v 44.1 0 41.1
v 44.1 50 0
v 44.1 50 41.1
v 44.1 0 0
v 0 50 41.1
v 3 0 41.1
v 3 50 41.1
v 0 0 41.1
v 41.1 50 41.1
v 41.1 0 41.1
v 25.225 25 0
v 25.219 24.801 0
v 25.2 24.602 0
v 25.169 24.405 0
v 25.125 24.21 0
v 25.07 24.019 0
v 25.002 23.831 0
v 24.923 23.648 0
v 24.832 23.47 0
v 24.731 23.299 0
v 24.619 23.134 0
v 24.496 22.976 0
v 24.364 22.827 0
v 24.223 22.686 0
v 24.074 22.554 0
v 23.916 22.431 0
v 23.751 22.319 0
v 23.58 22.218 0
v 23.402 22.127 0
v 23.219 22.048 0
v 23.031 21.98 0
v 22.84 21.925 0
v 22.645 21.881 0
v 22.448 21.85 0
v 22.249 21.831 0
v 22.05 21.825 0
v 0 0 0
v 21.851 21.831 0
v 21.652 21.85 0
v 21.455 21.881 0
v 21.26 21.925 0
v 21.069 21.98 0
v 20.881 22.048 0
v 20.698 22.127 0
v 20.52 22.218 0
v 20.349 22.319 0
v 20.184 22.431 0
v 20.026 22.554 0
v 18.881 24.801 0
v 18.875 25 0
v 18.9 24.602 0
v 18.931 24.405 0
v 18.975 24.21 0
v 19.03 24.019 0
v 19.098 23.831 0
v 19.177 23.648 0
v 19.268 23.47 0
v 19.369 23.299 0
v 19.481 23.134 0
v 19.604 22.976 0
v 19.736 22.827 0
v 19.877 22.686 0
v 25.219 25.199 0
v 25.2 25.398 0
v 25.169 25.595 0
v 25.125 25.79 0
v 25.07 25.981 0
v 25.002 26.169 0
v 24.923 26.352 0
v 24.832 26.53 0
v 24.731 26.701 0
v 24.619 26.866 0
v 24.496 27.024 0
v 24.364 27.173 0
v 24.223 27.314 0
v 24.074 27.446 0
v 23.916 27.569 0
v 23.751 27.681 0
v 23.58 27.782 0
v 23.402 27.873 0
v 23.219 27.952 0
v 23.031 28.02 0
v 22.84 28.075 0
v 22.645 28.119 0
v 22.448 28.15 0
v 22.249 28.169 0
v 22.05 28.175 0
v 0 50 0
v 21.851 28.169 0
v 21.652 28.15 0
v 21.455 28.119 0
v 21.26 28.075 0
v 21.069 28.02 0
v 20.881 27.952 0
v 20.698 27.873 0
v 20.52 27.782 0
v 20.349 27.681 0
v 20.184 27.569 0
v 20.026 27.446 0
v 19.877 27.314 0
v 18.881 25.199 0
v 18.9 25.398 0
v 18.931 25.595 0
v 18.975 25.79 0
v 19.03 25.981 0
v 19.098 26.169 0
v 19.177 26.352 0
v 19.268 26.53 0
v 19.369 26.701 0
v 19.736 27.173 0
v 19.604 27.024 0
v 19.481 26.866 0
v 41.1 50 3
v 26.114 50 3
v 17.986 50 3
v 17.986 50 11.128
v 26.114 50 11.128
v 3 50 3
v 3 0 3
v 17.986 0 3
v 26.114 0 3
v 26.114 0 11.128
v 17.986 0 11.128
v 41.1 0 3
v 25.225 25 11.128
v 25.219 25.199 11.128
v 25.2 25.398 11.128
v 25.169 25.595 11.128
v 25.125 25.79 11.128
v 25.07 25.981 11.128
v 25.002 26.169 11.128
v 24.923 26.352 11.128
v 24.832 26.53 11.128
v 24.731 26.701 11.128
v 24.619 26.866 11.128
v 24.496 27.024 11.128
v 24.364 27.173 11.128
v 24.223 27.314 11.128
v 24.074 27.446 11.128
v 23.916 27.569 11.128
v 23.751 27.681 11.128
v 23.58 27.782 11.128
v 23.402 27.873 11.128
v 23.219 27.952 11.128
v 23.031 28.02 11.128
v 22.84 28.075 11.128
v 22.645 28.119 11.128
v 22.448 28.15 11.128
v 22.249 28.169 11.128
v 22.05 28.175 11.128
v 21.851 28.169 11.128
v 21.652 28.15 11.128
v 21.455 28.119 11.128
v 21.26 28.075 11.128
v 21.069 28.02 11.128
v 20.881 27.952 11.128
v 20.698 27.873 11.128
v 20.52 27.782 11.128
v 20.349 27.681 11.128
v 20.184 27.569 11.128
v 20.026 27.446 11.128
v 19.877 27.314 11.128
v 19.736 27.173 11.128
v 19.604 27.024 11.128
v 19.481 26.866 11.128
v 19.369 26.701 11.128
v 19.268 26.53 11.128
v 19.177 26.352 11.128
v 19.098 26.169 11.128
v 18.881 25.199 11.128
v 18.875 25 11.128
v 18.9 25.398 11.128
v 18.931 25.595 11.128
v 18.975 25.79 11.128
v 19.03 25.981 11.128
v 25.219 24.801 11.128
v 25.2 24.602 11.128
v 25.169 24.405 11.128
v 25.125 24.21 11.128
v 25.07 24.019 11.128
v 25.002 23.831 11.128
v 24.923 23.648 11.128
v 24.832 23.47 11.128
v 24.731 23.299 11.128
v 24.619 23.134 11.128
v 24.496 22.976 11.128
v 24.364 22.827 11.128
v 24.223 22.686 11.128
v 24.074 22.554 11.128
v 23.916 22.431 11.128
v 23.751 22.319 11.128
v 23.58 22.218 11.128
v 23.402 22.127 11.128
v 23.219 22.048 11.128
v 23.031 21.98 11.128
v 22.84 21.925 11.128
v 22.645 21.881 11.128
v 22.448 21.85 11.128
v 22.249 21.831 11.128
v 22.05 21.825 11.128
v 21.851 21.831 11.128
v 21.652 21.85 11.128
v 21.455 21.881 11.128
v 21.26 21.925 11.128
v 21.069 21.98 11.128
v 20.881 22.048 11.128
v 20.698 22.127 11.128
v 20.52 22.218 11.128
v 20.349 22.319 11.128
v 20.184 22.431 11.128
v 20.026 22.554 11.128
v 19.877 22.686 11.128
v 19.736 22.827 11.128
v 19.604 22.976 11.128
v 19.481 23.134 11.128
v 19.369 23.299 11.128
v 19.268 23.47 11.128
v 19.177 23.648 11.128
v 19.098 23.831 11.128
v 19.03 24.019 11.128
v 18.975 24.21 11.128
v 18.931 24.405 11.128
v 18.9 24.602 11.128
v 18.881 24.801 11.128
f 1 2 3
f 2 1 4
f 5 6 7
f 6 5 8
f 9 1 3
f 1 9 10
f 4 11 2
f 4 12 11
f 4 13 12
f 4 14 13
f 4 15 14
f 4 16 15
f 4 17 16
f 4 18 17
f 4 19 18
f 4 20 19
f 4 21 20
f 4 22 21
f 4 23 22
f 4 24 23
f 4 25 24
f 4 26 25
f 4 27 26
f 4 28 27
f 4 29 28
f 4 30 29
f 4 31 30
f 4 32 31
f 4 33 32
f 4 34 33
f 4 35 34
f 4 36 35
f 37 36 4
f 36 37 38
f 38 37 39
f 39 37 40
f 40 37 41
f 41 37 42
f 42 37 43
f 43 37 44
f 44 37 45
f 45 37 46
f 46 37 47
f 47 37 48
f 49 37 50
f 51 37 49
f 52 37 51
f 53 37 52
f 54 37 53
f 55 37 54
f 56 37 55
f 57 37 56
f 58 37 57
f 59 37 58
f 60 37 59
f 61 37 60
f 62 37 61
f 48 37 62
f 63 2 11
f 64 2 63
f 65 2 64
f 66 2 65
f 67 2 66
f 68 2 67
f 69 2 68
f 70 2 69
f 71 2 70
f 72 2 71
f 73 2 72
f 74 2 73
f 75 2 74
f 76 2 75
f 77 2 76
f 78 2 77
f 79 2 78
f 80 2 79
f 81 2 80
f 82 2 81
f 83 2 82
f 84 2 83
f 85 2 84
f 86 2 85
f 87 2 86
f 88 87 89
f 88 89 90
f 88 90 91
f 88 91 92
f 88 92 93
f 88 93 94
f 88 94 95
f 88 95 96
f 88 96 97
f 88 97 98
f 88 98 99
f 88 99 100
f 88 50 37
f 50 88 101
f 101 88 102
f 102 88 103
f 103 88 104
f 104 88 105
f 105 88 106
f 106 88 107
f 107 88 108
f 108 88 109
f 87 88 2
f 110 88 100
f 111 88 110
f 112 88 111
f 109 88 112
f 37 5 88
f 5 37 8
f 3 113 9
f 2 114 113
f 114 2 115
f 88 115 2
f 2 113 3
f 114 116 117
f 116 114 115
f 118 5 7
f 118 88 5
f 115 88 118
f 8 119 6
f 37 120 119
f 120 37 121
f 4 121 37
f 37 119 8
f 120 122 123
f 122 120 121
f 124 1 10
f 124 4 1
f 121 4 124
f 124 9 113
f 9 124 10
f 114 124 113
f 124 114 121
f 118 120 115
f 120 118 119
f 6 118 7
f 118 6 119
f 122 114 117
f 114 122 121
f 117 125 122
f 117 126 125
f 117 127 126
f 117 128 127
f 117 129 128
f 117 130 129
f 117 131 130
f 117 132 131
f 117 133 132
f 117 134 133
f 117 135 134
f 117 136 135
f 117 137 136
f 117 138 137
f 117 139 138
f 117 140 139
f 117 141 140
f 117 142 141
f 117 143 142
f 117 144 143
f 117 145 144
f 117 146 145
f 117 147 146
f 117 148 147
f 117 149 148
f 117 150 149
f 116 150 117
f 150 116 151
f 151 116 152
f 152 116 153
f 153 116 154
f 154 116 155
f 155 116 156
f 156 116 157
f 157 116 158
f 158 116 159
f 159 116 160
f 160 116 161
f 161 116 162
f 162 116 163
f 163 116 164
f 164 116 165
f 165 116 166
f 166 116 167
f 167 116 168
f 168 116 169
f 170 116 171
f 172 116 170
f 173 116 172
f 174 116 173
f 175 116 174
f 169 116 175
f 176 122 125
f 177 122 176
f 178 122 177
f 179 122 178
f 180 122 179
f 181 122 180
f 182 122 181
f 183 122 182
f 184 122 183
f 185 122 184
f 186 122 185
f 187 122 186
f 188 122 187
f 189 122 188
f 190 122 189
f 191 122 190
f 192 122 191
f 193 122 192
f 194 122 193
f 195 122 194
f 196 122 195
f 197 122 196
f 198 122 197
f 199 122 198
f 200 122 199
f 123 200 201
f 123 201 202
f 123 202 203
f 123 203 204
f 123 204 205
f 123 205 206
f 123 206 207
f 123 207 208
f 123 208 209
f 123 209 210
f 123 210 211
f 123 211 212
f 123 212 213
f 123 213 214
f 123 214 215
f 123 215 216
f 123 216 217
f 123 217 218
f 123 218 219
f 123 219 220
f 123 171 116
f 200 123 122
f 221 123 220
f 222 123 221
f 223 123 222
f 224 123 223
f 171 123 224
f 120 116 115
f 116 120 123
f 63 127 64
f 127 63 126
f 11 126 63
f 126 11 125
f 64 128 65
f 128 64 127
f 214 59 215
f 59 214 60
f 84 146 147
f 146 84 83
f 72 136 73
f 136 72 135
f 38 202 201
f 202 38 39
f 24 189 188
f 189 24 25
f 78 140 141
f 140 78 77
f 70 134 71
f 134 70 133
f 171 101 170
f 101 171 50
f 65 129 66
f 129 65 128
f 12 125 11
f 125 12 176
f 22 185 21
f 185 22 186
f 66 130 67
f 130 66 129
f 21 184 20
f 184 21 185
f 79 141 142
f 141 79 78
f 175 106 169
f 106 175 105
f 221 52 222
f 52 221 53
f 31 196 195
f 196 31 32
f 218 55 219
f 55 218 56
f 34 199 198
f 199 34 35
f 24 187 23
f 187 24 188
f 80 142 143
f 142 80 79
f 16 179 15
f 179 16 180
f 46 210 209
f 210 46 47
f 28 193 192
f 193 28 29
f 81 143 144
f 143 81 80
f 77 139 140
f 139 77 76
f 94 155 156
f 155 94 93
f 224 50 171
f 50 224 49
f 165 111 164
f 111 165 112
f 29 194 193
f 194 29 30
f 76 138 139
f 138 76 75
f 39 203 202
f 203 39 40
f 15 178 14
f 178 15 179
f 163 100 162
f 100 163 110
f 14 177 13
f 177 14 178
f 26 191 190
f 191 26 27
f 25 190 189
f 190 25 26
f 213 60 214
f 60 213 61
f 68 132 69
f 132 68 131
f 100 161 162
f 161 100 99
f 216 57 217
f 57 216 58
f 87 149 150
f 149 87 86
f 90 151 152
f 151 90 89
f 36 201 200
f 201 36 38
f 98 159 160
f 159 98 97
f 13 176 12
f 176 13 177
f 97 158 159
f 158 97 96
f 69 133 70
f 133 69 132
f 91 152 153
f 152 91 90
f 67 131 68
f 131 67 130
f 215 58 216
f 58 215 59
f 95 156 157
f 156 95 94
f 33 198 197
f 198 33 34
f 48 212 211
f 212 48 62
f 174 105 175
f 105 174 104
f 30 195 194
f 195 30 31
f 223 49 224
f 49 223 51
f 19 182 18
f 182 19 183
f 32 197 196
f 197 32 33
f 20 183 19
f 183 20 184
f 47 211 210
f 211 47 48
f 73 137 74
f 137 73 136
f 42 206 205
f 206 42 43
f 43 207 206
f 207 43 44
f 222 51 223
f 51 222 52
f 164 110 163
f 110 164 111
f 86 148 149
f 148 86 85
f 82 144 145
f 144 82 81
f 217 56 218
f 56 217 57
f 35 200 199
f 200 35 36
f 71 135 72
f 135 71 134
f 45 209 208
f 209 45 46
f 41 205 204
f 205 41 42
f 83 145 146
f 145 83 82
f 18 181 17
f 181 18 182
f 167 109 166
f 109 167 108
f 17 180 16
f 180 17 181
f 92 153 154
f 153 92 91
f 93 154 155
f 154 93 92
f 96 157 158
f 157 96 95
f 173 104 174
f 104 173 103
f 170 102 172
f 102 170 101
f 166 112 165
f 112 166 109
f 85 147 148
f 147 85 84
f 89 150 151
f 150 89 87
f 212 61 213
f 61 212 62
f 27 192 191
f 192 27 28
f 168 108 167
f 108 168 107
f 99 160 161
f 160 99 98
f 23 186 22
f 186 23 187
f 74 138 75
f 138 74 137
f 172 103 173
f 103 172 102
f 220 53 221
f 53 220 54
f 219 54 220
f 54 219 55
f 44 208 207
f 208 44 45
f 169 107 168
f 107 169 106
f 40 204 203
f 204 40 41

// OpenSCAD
$fn = 100;
padding = 3;
xz = 38.1;
y = 50;
channel_xz = 8.128;
drill_dia = 6.35;
difference() {
  union() {
    //main hollow box
    difference() {
      cube([xz+padding*2, y, xz+padding]);
      translate([padding, -1, padding]) {
        cube([xz, y+2, xz+1]);
      }
    }
    //slot
    translate([(xz+padding*2)/2 - channel_xz/2, 0, padding]) {
      cube([channel_xz, y, channel_xz]);
    }
  }
  //channel
  translate([(xz+padding*2)/2, y/2, -1]) {
    cylinder(d=drill_dia, h=xz+padding*2);
  }
}
